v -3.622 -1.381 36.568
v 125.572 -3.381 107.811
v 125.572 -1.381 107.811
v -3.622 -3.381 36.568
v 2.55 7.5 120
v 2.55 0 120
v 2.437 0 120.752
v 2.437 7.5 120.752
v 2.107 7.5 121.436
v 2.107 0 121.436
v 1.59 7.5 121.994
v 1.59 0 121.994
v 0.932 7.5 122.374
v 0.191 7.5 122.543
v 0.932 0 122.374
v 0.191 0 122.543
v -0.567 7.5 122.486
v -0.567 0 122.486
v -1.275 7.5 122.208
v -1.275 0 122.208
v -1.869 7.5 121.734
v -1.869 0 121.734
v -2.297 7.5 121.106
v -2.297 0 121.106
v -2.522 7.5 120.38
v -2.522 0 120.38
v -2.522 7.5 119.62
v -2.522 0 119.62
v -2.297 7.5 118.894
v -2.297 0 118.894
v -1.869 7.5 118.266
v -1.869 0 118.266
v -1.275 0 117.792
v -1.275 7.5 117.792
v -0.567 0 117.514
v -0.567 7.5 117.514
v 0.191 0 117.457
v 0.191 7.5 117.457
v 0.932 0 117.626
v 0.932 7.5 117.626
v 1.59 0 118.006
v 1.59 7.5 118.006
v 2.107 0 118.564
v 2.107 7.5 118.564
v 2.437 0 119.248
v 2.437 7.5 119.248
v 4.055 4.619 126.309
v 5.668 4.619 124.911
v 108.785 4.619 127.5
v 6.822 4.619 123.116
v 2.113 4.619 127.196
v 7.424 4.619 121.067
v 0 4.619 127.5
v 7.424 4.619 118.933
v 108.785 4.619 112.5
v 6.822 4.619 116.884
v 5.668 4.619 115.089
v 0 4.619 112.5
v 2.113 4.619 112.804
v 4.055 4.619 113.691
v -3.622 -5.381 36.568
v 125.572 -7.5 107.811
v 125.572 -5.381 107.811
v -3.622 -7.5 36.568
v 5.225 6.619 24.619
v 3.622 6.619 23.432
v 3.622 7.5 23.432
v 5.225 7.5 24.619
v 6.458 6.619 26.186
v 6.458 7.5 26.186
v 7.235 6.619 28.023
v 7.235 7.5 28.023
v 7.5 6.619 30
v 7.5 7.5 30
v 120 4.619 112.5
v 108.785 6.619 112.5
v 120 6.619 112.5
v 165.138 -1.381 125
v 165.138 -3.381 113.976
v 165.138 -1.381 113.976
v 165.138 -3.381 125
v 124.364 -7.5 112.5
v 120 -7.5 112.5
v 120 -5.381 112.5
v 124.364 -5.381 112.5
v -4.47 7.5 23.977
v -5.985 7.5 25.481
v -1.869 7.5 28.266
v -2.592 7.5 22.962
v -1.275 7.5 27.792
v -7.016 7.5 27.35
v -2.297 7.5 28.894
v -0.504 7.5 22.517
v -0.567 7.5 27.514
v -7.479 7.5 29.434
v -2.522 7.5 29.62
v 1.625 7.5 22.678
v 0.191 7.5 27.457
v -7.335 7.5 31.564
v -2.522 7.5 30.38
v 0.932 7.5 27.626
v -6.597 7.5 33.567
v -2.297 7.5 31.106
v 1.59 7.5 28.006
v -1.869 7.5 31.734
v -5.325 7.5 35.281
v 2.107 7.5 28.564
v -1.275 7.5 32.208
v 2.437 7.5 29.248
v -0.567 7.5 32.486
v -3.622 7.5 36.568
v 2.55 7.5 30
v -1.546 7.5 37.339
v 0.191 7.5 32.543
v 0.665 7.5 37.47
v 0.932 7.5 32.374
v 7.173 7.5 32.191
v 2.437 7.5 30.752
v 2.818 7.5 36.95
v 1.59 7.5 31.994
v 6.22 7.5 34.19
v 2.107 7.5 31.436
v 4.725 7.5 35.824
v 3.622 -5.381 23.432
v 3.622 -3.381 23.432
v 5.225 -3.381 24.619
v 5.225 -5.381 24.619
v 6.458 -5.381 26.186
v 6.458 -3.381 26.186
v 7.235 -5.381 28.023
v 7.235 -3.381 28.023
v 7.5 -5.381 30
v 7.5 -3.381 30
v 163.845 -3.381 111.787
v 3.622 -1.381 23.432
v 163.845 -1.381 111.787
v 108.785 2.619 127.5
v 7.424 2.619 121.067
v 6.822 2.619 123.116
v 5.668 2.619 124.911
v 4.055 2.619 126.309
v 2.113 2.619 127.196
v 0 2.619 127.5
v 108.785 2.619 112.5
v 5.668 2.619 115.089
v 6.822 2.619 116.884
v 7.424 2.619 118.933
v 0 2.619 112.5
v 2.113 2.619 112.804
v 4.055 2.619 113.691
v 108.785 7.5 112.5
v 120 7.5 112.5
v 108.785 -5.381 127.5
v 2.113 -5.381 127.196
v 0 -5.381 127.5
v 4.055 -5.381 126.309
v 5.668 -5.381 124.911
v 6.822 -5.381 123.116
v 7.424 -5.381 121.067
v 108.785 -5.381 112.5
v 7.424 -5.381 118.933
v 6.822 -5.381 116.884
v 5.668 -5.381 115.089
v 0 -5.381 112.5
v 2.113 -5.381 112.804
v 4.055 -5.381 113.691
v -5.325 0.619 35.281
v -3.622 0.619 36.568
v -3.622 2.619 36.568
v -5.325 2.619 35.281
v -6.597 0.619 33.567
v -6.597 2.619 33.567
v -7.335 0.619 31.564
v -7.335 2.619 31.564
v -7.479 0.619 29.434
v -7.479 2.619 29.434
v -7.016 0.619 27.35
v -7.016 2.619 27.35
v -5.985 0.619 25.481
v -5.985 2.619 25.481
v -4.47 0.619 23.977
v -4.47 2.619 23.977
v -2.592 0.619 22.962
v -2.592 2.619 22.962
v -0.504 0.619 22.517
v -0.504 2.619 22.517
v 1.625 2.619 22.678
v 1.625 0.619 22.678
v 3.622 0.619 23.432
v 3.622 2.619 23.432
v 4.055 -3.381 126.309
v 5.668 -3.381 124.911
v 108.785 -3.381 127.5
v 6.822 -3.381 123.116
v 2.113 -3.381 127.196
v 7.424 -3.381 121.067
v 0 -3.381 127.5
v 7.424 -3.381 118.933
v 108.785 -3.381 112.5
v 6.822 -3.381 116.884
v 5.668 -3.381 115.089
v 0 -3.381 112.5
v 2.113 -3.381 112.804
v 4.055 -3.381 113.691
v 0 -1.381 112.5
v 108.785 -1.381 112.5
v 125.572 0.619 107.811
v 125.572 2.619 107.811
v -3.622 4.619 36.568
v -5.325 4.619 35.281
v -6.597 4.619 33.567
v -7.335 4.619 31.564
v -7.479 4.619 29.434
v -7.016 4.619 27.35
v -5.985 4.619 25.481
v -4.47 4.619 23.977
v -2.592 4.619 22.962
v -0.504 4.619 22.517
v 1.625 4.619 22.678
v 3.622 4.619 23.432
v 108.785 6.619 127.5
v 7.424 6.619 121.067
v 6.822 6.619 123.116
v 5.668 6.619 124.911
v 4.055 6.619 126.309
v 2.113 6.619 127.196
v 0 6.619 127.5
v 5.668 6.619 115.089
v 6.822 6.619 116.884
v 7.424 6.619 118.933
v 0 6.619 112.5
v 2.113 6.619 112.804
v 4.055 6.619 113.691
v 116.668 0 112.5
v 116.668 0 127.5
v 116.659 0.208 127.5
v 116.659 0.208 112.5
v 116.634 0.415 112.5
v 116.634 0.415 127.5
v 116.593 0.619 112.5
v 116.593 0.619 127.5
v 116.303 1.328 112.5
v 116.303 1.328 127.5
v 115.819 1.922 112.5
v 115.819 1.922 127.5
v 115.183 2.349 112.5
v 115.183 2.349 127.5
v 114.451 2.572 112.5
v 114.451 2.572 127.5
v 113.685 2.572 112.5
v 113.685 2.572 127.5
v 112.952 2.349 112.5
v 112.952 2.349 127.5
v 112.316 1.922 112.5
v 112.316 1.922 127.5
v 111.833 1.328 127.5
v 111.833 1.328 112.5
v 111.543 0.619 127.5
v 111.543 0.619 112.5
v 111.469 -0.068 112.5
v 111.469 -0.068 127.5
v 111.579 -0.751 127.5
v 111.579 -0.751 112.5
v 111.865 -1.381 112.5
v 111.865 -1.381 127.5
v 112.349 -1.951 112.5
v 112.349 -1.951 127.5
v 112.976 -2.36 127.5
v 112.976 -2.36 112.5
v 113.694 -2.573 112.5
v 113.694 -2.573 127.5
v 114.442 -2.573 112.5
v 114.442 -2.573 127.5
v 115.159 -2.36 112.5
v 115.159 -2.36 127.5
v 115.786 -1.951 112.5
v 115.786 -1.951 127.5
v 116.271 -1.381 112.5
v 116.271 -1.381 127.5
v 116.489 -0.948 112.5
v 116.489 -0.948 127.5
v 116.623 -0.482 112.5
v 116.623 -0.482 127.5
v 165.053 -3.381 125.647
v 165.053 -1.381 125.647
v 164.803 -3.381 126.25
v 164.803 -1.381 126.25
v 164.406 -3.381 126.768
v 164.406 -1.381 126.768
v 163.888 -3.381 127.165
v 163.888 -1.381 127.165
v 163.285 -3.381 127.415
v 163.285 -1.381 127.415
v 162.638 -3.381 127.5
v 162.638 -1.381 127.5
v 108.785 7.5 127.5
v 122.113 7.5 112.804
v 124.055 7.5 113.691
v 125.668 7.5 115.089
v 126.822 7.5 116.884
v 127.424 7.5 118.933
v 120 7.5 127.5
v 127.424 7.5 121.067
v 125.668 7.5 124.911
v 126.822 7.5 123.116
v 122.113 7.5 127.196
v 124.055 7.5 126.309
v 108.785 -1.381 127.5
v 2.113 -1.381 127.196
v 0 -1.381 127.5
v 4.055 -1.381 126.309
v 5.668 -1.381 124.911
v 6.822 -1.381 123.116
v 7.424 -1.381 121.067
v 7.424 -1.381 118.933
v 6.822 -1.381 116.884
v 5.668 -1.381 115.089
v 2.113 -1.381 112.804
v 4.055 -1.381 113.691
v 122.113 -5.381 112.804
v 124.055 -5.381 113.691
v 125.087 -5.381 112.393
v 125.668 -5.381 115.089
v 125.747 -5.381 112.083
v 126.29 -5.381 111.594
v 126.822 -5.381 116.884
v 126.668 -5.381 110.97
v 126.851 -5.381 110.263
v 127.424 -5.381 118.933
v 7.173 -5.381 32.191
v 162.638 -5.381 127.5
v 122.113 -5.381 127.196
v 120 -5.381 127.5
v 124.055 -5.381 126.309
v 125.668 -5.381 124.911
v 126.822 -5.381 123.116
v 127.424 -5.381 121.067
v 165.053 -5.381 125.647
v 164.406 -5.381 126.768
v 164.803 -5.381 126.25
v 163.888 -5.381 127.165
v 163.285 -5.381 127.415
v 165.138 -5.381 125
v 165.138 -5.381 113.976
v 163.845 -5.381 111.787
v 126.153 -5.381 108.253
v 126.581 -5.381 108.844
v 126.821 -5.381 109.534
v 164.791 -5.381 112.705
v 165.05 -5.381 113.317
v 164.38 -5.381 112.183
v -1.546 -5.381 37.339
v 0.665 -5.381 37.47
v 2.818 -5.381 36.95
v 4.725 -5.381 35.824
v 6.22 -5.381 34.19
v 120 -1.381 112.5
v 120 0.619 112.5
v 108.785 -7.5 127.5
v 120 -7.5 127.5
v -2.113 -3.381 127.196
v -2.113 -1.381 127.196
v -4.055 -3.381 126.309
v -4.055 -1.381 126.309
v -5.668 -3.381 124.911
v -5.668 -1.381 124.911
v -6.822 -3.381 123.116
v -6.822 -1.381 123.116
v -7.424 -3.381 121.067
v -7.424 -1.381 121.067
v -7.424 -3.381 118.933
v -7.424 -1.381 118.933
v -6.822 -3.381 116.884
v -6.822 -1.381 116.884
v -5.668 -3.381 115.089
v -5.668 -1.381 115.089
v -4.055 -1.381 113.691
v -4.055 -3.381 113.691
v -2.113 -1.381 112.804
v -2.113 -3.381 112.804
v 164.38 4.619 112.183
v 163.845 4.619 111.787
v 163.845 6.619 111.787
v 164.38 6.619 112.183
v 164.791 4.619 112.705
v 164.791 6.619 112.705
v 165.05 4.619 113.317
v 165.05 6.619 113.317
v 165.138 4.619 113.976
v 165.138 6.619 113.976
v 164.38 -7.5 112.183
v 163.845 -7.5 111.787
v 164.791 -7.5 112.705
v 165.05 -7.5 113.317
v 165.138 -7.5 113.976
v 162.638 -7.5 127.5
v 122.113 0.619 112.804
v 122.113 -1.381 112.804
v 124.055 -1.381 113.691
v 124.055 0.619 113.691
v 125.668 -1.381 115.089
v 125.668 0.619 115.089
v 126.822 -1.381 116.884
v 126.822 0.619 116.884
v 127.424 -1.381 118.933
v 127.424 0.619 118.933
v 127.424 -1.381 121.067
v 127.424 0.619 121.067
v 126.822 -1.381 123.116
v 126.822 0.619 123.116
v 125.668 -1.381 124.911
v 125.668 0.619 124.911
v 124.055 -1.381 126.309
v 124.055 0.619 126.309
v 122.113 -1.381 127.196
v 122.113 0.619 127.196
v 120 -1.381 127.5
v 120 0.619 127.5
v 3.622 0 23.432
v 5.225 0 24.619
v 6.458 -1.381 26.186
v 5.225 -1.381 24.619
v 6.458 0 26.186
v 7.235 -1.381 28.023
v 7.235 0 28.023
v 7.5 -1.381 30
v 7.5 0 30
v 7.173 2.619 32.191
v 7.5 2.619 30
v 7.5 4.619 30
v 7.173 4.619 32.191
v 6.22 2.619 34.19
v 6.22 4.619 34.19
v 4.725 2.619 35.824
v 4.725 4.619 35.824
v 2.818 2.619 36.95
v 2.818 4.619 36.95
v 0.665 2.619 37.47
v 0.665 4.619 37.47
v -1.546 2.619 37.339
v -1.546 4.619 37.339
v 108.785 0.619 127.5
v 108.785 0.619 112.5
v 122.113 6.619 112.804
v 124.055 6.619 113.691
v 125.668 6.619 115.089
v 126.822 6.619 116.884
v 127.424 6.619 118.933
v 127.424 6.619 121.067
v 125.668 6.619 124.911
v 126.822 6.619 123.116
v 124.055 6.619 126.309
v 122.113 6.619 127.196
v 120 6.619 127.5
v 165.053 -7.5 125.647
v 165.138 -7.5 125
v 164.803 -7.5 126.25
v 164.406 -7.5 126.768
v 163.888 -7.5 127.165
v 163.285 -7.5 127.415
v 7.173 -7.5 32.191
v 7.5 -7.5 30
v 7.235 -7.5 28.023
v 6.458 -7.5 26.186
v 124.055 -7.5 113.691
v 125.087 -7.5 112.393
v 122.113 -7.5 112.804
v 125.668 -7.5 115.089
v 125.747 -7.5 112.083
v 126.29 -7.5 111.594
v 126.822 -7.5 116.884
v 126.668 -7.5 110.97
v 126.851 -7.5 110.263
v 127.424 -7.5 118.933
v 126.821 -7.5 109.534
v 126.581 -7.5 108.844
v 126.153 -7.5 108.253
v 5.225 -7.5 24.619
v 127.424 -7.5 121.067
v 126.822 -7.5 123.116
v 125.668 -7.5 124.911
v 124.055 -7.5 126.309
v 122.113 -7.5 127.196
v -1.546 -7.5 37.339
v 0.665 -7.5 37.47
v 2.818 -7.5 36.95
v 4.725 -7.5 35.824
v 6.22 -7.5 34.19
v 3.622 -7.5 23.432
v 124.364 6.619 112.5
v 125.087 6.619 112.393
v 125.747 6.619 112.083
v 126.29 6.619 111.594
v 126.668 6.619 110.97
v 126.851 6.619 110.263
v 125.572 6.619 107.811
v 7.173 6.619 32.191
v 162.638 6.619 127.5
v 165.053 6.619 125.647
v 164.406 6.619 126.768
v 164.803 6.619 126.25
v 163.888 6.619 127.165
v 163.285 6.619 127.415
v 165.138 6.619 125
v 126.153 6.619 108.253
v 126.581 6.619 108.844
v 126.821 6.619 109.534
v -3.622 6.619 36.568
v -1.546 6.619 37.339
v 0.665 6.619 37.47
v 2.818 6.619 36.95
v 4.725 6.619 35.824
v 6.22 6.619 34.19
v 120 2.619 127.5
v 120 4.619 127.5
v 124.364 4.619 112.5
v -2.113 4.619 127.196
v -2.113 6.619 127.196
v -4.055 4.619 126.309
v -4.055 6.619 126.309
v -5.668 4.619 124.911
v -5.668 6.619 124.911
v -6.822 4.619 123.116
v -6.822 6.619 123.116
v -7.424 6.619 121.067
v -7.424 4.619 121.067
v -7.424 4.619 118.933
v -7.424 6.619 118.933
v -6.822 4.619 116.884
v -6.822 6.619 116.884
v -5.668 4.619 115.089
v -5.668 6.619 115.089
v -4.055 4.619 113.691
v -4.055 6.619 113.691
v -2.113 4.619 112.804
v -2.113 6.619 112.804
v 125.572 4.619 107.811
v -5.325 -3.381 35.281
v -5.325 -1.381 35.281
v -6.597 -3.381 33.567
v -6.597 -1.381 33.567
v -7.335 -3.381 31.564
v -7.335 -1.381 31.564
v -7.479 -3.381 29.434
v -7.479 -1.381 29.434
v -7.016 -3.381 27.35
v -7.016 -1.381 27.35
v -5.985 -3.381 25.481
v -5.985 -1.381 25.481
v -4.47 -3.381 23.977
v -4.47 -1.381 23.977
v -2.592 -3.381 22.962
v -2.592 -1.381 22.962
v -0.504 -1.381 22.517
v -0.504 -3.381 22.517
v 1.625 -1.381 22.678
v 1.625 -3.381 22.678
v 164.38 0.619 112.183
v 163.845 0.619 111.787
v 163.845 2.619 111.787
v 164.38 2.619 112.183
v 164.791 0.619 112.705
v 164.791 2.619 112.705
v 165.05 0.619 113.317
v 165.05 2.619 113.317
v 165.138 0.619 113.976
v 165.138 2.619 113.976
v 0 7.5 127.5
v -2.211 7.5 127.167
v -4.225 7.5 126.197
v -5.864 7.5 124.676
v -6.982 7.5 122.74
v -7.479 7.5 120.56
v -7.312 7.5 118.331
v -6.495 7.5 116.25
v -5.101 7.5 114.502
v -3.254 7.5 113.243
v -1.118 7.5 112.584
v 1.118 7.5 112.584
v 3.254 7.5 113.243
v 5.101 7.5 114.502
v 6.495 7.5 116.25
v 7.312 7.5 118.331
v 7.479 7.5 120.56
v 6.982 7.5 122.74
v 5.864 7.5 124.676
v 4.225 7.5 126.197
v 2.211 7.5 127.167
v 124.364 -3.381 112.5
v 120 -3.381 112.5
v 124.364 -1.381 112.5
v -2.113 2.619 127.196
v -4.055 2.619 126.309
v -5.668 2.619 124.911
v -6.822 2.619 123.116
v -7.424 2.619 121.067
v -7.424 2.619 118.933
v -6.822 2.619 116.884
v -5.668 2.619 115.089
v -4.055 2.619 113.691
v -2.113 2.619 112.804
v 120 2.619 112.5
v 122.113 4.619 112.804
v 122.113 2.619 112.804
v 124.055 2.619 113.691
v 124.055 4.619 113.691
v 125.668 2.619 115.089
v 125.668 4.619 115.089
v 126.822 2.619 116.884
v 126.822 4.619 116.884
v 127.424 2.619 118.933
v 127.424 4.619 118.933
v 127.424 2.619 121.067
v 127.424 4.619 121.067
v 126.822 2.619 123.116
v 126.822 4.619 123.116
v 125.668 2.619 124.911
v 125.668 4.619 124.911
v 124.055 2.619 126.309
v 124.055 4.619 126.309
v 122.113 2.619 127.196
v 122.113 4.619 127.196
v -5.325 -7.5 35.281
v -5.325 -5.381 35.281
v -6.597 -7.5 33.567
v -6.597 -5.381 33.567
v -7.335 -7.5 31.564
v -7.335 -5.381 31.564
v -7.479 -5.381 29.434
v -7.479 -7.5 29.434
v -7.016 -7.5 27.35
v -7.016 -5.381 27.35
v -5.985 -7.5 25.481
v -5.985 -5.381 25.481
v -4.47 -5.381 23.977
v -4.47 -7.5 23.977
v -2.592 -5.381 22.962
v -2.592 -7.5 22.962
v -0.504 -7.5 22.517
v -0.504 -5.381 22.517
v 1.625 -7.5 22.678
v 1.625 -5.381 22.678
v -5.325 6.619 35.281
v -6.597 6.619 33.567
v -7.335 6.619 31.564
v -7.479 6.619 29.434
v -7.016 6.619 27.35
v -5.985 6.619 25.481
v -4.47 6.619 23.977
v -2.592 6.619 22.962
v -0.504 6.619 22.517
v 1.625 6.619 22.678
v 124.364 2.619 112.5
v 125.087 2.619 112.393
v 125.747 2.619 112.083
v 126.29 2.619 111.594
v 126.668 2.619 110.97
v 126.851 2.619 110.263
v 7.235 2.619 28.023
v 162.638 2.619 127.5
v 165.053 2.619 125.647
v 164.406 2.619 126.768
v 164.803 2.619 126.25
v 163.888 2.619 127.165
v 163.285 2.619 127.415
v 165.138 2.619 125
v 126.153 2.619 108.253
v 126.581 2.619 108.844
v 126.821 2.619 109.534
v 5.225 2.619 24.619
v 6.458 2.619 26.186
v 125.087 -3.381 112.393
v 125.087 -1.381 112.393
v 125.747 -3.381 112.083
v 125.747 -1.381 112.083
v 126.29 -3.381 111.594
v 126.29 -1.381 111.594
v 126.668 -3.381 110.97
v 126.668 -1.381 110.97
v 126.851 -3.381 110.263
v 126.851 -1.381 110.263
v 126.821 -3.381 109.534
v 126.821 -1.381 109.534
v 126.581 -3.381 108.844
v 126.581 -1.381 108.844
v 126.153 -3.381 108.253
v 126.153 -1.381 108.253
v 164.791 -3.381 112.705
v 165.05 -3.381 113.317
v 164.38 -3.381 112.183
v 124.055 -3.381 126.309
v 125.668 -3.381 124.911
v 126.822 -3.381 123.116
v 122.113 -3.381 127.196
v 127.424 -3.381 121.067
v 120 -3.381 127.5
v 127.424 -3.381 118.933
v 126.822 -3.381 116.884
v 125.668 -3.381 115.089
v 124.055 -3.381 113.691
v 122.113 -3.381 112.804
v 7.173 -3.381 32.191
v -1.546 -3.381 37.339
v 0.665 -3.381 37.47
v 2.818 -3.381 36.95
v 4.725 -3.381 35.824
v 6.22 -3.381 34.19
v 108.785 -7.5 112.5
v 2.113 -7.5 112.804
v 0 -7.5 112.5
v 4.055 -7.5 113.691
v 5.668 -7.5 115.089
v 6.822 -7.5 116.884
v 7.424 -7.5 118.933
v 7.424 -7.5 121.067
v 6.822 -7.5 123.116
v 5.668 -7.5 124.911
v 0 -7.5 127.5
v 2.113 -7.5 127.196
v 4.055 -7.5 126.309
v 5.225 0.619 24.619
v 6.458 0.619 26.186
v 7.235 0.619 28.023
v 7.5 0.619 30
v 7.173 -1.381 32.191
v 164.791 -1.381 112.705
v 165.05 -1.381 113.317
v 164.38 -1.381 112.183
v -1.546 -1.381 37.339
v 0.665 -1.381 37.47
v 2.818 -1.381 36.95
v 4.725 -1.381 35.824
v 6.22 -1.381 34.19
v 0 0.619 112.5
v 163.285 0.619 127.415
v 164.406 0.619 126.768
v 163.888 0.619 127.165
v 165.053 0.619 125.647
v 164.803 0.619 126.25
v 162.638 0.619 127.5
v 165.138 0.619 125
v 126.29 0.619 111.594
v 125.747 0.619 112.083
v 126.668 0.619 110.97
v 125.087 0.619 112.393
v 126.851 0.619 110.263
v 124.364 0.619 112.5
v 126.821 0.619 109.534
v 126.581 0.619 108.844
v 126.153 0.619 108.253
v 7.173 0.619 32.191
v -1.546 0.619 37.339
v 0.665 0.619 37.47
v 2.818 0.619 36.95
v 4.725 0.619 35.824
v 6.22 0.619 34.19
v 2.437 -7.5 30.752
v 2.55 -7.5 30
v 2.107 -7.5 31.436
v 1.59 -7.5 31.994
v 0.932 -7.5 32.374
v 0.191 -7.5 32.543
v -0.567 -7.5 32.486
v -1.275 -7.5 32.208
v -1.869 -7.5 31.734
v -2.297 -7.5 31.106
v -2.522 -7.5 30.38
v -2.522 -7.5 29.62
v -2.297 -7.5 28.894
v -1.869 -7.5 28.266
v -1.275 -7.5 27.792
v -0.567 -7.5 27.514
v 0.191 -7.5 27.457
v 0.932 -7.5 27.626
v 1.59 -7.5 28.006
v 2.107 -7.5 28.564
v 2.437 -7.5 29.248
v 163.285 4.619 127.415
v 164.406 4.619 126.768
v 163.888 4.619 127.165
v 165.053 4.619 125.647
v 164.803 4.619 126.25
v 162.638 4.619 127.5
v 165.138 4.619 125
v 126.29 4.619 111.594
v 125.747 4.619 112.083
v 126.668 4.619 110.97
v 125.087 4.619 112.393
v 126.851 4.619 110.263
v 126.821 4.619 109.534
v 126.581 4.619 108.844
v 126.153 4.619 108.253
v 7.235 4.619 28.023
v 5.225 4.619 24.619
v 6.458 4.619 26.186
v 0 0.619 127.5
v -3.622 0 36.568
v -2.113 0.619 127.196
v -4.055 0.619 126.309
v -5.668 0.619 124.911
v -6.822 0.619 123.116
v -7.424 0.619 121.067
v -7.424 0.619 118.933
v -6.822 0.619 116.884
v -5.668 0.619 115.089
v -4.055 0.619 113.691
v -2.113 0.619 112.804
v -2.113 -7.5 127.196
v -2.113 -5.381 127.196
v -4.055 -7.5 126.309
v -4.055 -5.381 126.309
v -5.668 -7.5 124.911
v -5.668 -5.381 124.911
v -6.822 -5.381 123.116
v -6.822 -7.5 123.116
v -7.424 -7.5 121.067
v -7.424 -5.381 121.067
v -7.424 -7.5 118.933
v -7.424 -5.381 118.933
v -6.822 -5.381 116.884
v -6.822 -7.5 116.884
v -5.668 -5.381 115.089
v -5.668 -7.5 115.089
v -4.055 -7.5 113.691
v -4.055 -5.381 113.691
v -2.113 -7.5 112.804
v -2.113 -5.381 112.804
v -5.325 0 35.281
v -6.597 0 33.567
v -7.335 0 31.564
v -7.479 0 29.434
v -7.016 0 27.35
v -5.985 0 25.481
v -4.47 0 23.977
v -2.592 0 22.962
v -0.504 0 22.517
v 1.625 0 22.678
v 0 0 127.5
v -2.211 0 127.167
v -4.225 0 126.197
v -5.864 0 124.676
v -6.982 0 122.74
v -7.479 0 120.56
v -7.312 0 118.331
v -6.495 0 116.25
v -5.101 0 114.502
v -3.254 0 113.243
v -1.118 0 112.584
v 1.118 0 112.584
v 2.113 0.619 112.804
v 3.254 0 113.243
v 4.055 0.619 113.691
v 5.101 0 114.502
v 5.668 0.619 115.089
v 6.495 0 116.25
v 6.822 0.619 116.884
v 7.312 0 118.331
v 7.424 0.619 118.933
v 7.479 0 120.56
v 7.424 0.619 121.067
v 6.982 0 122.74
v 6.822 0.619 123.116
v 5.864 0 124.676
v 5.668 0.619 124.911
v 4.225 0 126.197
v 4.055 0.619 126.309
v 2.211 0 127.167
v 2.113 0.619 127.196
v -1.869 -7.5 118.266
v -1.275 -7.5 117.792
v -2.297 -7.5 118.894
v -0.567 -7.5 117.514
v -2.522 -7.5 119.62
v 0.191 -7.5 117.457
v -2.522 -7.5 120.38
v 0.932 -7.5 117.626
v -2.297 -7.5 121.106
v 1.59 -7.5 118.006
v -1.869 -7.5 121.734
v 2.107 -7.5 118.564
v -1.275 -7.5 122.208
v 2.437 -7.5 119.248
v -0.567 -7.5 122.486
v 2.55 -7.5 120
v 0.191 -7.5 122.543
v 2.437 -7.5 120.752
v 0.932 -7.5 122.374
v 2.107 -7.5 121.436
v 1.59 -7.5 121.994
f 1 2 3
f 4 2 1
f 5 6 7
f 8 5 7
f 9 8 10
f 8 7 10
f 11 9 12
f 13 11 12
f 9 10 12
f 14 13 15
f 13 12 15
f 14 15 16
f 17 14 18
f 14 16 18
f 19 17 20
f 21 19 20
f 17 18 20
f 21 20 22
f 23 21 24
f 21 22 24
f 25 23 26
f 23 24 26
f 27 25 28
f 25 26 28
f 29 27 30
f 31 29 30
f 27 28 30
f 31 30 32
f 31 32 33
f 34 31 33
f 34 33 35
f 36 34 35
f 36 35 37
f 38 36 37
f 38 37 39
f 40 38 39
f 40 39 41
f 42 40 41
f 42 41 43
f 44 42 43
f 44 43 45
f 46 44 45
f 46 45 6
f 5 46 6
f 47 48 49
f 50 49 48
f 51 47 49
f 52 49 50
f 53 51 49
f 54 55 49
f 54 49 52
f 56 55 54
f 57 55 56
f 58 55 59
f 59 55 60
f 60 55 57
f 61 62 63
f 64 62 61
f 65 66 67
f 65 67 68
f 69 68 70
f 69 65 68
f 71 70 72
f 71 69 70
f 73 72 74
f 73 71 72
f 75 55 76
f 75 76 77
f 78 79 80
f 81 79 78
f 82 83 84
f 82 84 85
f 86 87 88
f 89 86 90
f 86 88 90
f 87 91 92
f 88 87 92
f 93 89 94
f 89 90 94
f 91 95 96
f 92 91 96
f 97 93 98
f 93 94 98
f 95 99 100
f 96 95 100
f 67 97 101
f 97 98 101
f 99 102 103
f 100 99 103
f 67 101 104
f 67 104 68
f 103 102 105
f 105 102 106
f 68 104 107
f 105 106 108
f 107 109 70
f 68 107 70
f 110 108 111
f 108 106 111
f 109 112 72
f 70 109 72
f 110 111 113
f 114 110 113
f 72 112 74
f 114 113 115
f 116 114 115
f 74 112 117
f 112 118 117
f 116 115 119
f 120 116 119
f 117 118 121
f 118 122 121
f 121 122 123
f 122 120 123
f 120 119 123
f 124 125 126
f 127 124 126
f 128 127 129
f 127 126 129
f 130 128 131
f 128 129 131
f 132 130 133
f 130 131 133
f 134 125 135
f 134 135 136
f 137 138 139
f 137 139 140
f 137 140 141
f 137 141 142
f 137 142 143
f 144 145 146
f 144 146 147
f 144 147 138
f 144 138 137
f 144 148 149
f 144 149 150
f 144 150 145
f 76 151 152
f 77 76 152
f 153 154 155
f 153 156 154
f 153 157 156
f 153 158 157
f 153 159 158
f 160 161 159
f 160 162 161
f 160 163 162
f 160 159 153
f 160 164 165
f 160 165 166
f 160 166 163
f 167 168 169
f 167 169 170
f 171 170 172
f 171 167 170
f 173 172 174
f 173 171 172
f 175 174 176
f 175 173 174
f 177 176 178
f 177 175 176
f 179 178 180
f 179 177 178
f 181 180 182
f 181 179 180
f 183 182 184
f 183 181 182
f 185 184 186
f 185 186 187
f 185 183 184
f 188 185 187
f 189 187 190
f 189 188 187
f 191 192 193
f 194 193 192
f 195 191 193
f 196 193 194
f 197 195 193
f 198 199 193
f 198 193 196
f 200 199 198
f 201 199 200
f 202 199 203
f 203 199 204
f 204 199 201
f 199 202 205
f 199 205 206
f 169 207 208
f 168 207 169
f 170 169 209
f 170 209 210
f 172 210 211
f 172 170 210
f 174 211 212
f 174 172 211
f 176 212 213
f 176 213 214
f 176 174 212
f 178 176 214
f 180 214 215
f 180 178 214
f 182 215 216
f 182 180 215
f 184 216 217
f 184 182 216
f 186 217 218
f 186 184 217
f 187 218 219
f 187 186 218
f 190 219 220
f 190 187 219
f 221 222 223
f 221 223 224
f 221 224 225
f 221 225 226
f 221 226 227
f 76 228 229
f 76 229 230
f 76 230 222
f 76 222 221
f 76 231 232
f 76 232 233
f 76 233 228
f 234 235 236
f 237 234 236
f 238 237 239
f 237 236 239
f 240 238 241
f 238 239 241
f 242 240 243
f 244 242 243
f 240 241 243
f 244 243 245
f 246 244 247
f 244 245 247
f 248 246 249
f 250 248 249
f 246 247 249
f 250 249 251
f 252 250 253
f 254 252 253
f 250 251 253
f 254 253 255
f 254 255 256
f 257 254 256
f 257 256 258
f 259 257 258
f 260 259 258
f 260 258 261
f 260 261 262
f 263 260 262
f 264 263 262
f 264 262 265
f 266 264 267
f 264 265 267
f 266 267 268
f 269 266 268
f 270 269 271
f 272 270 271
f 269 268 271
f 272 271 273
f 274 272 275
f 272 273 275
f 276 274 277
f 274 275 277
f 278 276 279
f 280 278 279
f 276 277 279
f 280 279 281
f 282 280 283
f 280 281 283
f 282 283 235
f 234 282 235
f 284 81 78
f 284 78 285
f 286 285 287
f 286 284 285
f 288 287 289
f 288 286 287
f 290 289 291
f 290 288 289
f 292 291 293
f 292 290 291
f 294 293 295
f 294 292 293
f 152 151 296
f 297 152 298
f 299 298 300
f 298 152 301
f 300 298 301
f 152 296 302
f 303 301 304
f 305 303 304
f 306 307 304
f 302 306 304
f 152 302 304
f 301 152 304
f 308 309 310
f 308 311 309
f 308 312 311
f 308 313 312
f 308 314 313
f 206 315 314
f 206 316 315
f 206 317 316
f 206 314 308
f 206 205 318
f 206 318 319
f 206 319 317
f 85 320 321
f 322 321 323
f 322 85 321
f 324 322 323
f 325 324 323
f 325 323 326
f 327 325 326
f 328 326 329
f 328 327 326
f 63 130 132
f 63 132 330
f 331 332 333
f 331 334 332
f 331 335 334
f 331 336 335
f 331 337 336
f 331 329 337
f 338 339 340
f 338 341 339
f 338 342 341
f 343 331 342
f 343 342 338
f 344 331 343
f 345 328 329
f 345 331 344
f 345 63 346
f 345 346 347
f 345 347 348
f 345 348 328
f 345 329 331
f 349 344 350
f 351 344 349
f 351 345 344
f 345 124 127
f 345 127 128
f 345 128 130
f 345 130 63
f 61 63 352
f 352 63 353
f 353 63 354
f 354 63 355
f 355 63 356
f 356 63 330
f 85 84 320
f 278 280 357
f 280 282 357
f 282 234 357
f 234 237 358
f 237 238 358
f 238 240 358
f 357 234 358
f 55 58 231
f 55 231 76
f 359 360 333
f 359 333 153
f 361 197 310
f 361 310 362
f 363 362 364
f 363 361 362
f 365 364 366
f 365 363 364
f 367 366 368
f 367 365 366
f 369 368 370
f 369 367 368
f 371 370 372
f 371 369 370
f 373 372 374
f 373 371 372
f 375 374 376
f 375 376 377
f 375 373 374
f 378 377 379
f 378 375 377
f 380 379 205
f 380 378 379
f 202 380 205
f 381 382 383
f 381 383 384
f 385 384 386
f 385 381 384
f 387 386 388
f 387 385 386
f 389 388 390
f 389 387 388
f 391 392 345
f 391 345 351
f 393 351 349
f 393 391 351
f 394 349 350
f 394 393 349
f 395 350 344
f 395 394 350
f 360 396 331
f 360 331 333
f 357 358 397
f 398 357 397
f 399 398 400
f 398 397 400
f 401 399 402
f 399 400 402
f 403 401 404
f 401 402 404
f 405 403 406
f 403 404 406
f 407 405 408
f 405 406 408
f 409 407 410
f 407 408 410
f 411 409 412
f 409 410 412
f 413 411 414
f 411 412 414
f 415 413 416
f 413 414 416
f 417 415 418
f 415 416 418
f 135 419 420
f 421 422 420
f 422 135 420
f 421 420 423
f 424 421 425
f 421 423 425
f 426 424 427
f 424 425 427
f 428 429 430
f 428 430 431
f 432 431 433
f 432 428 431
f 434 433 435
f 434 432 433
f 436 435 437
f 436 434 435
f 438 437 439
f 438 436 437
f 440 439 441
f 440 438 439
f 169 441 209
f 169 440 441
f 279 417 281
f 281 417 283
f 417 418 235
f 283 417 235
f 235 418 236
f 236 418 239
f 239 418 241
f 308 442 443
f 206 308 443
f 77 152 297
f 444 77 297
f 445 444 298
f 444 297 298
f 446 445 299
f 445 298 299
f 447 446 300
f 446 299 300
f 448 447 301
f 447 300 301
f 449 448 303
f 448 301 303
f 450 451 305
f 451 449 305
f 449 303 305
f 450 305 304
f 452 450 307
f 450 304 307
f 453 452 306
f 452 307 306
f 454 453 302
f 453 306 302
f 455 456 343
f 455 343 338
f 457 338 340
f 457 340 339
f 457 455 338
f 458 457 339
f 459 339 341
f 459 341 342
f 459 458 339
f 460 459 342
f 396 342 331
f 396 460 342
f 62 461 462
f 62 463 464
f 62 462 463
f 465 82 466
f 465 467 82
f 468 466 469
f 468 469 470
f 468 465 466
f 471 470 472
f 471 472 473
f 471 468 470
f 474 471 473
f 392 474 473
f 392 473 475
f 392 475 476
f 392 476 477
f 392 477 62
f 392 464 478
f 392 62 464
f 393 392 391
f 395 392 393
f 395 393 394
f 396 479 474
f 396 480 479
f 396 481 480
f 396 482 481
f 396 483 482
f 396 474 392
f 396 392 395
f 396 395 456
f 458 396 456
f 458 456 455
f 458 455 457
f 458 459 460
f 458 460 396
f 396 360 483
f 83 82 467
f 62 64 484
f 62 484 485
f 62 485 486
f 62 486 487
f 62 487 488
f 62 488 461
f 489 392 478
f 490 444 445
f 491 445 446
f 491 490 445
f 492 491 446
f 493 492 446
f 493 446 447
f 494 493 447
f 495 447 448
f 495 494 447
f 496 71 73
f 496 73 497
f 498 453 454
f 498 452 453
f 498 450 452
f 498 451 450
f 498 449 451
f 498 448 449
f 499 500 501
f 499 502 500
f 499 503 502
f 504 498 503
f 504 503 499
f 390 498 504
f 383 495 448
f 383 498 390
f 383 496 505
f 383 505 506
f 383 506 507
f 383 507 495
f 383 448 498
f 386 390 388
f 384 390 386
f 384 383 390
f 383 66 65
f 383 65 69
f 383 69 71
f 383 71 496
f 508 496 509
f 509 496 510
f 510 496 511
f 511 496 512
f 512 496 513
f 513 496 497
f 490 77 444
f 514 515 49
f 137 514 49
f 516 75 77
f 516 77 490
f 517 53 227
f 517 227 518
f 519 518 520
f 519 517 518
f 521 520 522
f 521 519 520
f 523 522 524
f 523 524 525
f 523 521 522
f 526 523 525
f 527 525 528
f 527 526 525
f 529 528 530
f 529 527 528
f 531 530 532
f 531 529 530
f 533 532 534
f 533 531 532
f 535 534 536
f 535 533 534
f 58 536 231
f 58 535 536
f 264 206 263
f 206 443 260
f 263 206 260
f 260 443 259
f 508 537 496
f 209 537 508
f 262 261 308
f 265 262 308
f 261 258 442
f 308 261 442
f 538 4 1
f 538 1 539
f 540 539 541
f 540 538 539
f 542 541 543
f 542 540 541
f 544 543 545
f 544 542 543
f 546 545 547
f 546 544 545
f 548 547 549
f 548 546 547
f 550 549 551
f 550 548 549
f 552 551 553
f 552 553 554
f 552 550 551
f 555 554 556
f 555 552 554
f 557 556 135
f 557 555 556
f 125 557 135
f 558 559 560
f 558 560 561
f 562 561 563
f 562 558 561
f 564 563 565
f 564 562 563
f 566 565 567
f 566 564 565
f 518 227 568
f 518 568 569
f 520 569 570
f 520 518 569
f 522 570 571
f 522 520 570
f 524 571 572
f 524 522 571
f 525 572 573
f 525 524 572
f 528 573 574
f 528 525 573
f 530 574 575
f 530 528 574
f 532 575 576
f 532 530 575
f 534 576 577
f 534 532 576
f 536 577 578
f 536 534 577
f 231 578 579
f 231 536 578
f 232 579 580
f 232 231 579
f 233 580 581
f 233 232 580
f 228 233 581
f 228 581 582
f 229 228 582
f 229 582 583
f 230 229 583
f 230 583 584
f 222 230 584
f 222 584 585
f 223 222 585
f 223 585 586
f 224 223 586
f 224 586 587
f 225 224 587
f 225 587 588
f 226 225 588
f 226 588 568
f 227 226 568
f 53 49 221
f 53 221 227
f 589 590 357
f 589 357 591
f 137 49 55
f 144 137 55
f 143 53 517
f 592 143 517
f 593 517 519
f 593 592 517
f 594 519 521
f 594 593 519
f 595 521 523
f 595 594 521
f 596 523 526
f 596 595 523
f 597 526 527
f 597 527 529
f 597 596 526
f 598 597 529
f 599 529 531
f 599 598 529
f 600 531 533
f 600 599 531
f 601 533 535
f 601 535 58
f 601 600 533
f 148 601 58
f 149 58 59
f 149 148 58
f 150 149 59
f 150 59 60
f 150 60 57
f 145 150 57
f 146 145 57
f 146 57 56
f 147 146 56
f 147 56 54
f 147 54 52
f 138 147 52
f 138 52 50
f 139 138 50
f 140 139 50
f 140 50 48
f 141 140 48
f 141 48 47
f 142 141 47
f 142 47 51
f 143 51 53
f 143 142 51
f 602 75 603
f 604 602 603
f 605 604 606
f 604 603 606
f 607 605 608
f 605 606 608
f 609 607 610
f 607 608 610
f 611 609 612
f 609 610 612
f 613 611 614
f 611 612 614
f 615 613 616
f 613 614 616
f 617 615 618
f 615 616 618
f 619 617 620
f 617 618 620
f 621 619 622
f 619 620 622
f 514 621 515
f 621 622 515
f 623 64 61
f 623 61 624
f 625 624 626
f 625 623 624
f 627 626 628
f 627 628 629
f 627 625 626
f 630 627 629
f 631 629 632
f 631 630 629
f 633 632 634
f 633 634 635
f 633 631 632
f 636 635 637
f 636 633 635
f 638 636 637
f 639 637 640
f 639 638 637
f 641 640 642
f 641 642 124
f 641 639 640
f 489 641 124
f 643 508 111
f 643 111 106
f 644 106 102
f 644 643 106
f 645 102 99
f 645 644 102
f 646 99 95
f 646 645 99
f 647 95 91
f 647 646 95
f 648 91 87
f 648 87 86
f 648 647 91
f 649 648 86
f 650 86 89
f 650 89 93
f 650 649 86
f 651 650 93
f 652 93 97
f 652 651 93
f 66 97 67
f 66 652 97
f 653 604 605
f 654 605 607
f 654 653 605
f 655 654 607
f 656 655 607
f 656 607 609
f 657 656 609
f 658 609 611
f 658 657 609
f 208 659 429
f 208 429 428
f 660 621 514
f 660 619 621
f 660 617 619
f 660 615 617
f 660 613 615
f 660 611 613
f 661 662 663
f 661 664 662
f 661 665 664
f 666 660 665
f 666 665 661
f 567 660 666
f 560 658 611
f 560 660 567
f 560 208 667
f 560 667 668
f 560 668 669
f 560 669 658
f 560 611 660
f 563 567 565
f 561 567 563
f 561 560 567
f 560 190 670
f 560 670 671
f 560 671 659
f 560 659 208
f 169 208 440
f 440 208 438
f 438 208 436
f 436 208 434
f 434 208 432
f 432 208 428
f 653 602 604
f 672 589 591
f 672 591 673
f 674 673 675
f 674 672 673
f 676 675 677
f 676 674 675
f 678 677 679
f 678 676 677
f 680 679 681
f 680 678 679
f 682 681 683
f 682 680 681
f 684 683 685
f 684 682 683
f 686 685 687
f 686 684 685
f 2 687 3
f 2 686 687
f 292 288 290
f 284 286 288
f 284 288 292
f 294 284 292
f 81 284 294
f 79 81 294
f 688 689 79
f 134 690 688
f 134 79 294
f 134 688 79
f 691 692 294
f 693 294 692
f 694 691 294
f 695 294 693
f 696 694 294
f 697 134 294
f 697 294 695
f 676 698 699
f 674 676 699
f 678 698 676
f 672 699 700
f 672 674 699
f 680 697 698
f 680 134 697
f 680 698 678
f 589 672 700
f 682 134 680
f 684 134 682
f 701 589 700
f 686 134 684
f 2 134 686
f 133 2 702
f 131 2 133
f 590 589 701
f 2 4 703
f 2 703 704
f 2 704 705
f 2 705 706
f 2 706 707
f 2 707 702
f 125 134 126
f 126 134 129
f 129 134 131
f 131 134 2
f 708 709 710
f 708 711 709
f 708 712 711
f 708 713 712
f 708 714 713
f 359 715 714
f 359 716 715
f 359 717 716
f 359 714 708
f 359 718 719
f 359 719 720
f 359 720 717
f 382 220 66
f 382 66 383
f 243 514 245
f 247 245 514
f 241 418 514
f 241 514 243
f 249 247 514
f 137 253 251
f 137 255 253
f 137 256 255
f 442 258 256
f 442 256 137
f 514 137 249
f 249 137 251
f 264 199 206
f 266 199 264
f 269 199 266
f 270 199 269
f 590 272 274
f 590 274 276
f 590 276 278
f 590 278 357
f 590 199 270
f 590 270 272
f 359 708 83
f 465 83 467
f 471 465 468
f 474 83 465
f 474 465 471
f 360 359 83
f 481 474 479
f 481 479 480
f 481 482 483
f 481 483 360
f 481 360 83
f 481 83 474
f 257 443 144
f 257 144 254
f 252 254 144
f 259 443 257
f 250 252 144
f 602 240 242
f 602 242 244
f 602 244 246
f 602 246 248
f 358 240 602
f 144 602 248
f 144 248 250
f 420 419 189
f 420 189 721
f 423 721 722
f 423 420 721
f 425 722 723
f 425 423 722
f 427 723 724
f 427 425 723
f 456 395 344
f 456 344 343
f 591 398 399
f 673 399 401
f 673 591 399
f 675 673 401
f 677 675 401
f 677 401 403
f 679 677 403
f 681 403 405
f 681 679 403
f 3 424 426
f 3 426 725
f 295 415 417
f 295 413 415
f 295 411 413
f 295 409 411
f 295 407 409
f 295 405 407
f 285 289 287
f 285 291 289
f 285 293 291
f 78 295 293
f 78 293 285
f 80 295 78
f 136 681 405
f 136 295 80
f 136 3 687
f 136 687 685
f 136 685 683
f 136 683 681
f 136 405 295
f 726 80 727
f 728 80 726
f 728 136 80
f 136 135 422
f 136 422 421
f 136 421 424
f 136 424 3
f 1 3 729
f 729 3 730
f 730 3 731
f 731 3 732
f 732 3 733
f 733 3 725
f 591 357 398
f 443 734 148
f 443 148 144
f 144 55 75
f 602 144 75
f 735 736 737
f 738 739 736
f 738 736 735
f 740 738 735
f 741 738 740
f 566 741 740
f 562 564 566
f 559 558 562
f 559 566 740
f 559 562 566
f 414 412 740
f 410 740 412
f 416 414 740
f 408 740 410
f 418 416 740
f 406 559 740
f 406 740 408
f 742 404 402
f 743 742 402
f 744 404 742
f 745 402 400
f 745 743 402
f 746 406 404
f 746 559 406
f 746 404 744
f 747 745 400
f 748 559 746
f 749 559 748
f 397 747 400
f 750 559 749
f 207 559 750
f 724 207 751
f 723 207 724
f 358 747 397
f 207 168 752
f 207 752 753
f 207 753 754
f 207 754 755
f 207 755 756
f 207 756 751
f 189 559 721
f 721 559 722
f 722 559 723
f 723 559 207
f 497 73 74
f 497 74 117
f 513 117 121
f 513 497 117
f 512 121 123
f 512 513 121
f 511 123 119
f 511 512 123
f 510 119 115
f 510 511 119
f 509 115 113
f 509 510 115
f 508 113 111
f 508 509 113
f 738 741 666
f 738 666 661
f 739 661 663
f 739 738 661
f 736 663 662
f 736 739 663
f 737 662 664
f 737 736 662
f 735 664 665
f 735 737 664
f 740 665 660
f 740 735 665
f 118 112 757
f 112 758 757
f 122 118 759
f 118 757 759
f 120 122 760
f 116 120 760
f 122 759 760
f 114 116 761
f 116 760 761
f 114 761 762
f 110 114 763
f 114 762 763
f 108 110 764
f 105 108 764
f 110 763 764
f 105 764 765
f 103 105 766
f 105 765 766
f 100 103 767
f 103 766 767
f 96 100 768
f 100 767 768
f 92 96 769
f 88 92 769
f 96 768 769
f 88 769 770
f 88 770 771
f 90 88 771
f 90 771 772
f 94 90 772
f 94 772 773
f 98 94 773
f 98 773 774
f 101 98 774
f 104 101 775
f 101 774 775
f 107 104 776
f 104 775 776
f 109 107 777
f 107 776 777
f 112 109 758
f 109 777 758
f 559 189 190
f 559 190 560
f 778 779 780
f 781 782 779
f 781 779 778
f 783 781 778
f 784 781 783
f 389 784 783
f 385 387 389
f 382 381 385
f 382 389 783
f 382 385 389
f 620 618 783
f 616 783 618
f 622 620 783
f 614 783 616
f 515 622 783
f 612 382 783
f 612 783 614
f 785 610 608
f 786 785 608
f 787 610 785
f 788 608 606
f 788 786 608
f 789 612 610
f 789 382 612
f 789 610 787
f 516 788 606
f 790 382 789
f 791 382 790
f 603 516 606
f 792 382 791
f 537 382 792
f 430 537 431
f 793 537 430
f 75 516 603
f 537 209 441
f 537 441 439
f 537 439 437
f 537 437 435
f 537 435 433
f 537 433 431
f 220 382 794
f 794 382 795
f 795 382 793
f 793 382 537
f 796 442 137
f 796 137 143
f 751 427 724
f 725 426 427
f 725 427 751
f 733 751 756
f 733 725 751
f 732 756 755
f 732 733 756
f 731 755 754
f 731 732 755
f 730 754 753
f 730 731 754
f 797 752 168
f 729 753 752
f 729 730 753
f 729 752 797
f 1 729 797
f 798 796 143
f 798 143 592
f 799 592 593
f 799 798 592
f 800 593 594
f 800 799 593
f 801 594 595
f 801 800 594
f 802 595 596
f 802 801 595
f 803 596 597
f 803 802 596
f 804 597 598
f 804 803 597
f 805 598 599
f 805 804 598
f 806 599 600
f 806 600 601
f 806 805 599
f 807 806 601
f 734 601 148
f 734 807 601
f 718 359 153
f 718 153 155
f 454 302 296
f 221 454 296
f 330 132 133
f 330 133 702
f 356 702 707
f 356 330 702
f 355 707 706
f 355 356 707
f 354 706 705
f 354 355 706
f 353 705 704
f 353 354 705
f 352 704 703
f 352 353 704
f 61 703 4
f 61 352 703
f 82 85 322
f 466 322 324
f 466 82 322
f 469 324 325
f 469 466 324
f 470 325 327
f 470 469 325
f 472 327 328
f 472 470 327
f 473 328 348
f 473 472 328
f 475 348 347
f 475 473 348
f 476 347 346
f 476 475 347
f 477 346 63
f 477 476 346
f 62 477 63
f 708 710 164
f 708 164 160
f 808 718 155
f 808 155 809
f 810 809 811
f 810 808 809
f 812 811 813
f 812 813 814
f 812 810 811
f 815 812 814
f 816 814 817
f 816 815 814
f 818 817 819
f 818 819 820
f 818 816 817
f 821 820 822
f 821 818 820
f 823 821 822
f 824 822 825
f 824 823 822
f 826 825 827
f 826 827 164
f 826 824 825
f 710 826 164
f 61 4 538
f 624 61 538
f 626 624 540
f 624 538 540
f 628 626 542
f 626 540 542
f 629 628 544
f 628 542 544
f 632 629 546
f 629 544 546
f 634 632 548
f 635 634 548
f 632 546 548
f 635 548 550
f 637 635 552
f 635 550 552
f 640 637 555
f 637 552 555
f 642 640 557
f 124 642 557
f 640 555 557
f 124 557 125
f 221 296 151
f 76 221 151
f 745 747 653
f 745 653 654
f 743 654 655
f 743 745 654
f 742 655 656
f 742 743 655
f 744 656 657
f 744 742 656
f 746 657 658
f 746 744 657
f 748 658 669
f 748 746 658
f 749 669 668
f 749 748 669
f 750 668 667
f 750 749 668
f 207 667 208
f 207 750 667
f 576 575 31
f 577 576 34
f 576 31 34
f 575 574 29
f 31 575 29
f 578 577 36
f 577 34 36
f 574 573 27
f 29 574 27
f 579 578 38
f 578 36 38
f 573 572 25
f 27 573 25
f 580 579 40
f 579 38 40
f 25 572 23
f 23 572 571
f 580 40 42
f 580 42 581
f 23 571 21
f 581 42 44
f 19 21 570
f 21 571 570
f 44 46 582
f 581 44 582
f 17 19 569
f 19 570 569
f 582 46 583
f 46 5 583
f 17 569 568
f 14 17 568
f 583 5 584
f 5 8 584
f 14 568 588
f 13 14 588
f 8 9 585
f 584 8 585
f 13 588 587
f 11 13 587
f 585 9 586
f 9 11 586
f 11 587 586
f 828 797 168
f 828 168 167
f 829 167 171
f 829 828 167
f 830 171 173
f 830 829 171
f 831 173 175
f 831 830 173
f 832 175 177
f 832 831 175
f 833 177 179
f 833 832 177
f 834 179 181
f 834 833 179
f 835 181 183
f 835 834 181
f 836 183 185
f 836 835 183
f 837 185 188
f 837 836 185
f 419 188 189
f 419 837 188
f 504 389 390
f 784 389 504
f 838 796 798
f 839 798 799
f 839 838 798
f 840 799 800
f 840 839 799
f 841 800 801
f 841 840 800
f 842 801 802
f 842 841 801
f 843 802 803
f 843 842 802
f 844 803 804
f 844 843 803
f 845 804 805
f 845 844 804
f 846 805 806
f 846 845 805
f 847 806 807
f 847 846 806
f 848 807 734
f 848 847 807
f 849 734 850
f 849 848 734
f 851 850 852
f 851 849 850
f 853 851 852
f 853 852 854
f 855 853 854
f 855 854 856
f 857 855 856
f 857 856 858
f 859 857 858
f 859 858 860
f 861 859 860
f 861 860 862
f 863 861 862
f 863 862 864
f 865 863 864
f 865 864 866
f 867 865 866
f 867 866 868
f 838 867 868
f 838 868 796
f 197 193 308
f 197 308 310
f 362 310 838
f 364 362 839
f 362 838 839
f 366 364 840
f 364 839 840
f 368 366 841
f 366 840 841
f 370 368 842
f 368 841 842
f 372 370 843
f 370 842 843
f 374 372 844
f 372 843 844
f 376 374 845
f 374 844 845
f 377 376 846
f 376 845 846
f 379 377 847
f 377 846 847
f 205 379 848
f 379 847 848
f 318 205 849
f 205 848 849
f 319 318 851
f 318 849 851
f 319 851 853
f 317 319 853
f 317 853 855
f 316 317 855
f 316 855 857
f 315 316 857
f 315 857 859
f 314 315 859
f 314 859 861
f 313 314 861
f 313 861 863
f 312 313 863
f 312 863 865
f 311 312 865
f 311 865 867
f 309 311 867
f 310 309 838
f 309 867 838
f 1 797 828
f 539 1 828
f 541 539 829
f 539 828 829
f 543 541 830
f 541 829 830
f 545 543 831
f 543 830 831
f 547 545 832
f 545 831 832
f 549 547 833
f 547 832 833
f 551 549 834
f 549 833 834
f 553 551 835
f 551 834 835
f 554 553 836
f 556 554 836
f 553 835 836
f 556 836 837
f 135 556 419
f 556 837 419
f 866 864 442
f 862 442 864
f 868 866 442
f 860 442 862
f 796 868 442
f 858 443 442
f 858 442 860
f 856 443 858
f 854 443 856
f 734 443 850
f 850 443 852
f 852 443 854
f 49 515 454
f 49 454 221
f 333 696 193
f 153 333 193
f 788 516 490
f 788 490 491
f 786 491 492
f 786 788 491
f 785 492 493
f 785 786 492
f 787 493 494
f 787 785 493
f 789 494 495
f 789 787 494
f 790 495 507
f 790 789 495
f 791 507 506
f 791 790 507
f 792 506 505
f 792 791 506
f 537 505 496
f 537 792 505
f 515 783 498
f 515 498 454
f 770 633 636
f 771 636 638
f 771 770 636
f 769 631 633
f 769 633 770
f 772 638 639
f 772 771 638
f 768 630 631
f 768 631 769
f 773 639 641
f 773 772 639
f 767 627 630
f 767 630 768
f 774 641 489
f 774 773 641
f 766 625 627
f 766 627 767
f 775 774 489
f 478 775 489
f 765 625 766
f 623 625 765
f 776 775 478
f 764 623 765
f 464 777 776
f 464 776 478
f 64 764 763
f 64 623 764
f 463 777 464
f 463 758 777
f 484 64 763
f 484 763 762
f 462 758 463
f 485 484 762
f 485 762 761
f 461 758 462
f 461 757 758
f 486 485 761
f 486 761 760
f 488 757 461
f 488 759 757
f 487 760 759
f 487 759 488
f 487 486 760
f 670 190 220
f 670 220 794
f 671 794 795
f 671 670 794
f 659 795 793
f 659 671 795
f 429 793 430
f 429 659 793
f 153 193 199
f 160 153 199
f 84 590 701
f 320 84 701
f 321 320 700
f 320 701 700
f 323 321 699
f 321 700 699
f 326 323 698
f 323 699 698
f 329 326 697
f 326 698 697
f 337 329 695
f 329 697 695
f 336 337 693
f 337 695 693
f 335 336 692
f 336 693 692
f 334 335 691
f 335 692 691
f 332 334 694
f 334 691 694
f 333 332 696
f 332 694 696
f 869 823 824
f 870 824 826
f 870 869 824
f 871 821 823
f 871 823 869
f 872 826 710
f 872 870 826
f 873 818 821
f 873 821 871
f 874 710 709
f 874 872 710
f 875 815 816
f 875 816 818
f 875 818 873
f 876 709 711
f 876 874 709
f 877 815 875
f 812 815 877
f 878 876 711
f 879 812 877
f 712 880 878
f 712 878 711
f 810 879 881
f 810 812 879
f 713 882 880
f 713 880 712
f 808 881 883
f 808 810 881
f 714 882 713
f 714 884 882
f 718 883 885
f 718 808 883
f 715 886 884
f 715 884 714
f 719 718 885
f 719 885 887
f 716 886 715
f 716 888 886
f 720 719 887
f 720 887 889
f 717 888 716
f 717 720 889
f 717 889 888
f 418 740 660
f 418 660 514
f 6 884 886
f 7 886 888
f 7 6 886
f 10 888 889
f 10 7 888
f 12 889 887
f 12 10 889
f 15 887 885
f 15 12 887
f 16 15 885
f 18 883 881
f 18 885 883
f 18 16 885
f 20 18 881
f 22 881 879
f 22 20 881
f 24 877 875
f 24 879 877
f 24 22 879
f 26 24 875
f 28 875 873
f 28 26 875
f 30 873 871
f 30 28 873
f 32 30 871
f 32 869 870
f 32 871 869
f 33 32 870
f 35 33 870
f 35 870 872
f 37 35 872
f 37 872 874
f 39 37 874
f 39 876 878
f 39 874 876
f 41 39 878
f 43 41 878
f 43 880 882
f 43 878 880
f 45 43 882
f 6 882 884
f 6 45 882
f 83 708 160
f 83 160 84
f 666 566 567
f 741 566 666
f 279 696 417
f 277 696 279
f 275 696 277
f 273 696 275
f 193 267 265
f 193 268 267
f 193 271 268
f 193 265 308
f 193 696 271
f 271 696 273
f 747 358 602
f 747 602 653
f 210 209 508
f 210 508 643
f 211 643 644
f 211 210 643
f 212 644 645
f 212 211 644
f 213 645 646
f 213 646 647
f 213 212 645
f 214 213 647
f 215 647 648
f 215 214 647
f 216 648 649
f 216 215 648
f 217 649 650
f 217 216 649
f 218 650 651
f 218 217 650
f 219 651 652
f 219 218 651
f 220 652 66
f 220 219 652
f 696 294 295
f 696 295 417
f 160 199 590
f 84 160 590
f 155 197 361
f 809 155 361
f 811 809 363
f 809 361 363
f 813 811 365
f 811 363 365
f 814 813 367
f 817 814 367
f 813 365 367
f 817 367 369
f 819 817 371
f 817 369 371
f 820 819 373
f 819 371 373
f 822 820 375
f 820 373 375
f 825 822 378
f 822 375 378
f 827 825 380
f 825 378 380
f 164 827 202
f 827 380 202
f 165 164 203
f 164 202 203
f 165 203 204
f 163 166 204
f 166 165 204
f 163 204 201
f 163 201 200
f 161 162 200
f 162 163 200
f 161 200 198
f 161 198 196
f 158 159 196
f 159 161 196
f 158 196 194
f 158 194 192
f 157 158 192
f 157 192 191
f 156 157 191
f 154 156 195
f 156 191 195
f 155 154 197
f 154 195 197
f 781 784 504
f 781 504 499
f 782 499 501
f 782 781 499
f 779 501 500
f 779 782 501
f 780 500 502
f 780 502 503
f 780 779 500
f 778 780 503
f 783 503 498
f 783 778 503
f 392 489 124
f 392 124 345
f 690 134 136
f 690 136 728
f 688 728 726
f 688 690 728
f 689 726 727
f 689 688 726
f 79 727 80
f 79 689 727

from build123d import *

# Parameters (mm, degrees)
F1_DEPTH = 7.5
F2_W     = 25
F2_H     = 2
F2_W_2   = 87.9392416629
F3_DEPTH = 127.501
F4_DEPTH = 7.5
F5_D     = 3
F5_DEPTH = 13.5
F5_TIP   = 0.9012909285
F7_R     = 2.6
F8_DEPTH = 15
F6_R     = 2.55
F9_DEPTH = 12.5


with BuildPart() as f1:
    # F0 (on Front) → F1 (new body, symmetric)
    with BuildSketch(Plane.XZ):
        with BuildLine():
            ThreePointArc((0, 127.5), (5.3033008589, 125.3033008589), (7.5, 120))
            ThreePointArc((7.5, 120), (5.3033008589, 114.6966991411), (0, 112.5))
            Line((0, 112.5), (108.7850481272, 112.5))
            Line((108.7850481272, 112.5), (108.7850481272, 127.5))
            Line((108.7850481272, 127.5), (0, 127.5))
        make_face()
        with BuildLine():
            Line((120, 127.5), (108.7850481272, 127.5))
            Line((108.7850481272, 127.5), (108.7850481272, 112.5))
            Line((108.7850481272, 112.5), (120, 112.5))
            ThreePointArc((120, 112.5), (127.5, 120), (120, 127.5))
        make_face()
        with BuildLine():
            ThreePointArc((0, 112.5), (5.3033008589, 114.6966991411), (7.5, 120))
            ThreePointArc((7.5, 120), (5.3033008589, 125.3033008589), (0, 127.5))
            ThreePointArc((0, 127.5), (-7.5, 120), (0, 112.5))
        make_face()
        with BuildLine():
            Line((162.6379891518, 127.5), (120, 127.5))
            ThreePointArc((120, 127.5), (127.5, 120), (120, 112.5))
            Line((120, 112.5), (124.3643918131, 112.5))
            ThreePointArc((124.3643918131, 112.5), (126.7854456219, 110.6232964421), (125.5716191931, 107.8107987637))
            Line((125.5716191931, 107.8107987637), (-3.6216821402, 36.5676037088))
            ThreePointArc((-3.6216821402, 36.5676037088), (3.813619275, 36.4580421202), (7.5, 30))
            ThreePointArc((7.5, 30), (6.4580421202, 26.186380725), (3.6216821402, 23.4323962912))
            Line((3.6216821402, 23.4323962912), (163.8452165318, 111.7871050513))
            ThreePointArc((163.8452165318, 111.7871050513), (164.7906698585, 112.7050998626), (165.1379891518, 113.9763062876))
            Line((165.1379891518, 113.9763062876), (165.1379891518, 125))
            ThreePointArc((165.1379891518, 125), (164.4057561047, 126.767766953), (162.6379891518, 127.5))
        make_face()
        with BuildLine():
            ThreePointArc((7.5, 30), (3.813619275, 36.4580421202), (-3.6216821402, 36.5676037088))
            ThreePointArc((-3.6216821402, 36.5676037088), (-6.5676037088, 26.3783178598), (3.6216821402, 23.4323962912))
            ThreePointArc((3.6216821402, 23.4323962912), (6.4580421202, 26.186380725), (7.5, 30))
        make_face()
    extrude(amount=F1_DEPTH, both=True)

    # F2 (on Top) → F3 (cut, through all)
    with BuildSketch(Plane.XY):
        with Locations((23.2615718412, 7.6191863865)):
            Rectangle(F2_W, F2_H)
        with Locations((-1.7384281588, 7.6191863865)):
            Rectangle(F2_W, F2_H)
        with Locations((261.2008135041, 7.6191863865)):
            Rectangle(F2_W, F2_H)
        with Locations((211.2008135041, 7.6191863865)):
            Rectangle(F2_W, F2_H)
        with Locations((48.2615718412, 7.6191863865)):
            Rectangle(F2_W, F2_H)
        with Locations((236.2008135041, 7.6191863865)):
            Rectangle(F2_W, F2_H)
        with Locations((186.2008135041, 7.6191863865)):
            Rectangle(F2_W, F2_H)
        with Locations((129.7311926726, 7.6191863865)):
            Rectangle(F2_W_2, F2_H)
        with Locations((73.2615718412, 7.6191863865)):
            Rectangle(F2_W, F2_H)
        with Locations((48.2615718412, 3.6191863865)):
            Rectangle(F2_W, F2_H)
        with Locations((73.2615718412, 3.6191863865)):
            Rectangle(F2_W, F2_H)
        with Locations((-1.7384281588, 3.6191863865)):
            Rectangle(F2_W, F2_H)
        with Locations((261.2008135041, 3.6191863865)):
            Rectangle(F2_W, F2_H)
        with Locations((23.2615718412, 3.6191863865)):
            Rectangle(F2_W, F2_H)
        with Locations((236.2008135041, 3.6191863865)):
            Rectangle(F2_W, F2_H)
        with Locations((129.7311926726, 3.6191863865)):
            Rectangle(F2_W_2, F2_H)
        with Locations((186.2008135041, 3.6191863865)):
            Rectangle(F2_W, F2_H)
        with Locations((211.2008135041, 3.6191863865)):
            Rectangle(F2_W, F2_H)
        with Locations((261.2008135041, -0.3808136135)):
            Rectangle(F2_W, F2_H)
        with Locations((129.7311926726, -0.3808136135)):
            Rectangle(F2_W_2, F2_H)
        with Locations((48.2615718412, -0.3808136135)):
            Rectangle(F2_W, F2_H)
        with Locations((73.2615718412, -0.3808136135)):
            Rectangle(F2_W, F2_H)
        with Locations((-1.7384281588, -0.3808136135)):
            Rectangle(F2_W, F2_H)
        with Locations((23.2615718412, -0.3808136135)):
            Rectangle(F2_W, F2_H)
        with Locations((236.2008135041, -0.3808136135)):
            Rectangle(F2_W, F2_H)
        with Locations((186.2008135041, -0.3808136135)):
            Rectangle(F2_W, F2_H)
        with Locations((211.2008135041, -0.3808136135)):
            Rectangle(F2_W, F2_H)
        with Locations((236.2008135041, -4.3808136135)):
            Rectangle(F2_W, F2_H)
        with Locations((261.2008135041, -4.3808136135)):
            Rectangle(F2_W, F2_H)
        with Locations((48.2615718412, -4.3808136135)):
            Rectangle(F2_W, F2_H)
        with Locations((73.2615718412, -4.3808136135)):
            Rectangle(F2_W, F2_H)
        with Locations((129.7311926726, -4.3808136135)):
            Rectangle(F2_W_2, F2_H)
        with Locations((186.2008135041, -4.3808136135)):
            Rectangle(F2_W, F2_H)
        with Locations((211.2008135041, -4.3808136135)):
            Rectangle(F2_W, F2_H)
        with Locations((23.2615718412, -4.3808136135)):
            Rectangle(F2_W, F2_H)
        with Locations((-1.7384281588, -4.3808136135)):
            Rectangle(F2_W, F2_H)
    extrude(amount=F3_DEPTH, mode=Mode.SUBTRACT)

    # F0 (on Front) → F4 (join, symmetric)
    with BuildSketch(Plane.XZ):
        with BuildLine():
            ThreePointArc((0, 112.5), (5.3033008589, 114.6966991411), (7.5, 120))
            ThreePointArc((7.5, 120), (5.3033008589, 125.3033008589), (0, 127.5))
            ThreePointArc((0, 127.5), (-7.5, 120), (0, 112.5))
        make_face()
        with BuildLine():
            Line((120, 127.5), (108.7850481272, 127.5))
            Line((108.7850481272, 127.5), (108.7850481272, 112.5))
            Line((108.7850481272, 112.5), (120, 112.5))
            ThreePointArc((120, 112.5), (127.5, 120), (120, 127.5))
        make_face()
        with BuildLine():
            ThreePointArc((7.5, 30), (3.813619275, 36.4580421202), (-3.6216821402, 36.5676037088))
            ThreePointArc((-3.6216821402, 36.5676037088), (-6.5676037088, 26.3783178598), (3.6216821402, 23.4323962912))
            ThreePointArc((3.6216821402, 23.4323962912), (6.4580421202, 26.186380725), (7.5, 30))
        make_face()
    extrude(amount=F4_DEPTH, both=True)

    # F5 (one way)
    with BuildSketch(Plane.XZ):
        with Locations((0, 120), (0, 30)):
            Circle(F5_D / 2)
    extrude(amount=-F5_DEPTH, mode=Mode.SUBTRACT)
    with Locations(Plane.XZ):
        with Locations((0, 120), (0, 30)):
            with Locations((0, 0, -(F5_DEPTH + F5_TIP / 2))):  # 118° drill point
                Cone(0, F5_D / 2, F5_TIP, mode=Mode.SUBTRACT)

    # F7 (on face) → F8 (cut, through all)
    with BuildSketch(Plane.XY.offset(127.5)):
        with Locations((114.0677630901, 0)):
            Circle(F7_R)
    extrude(amount=-F8_DEPTH, mode=Mode.SUBTRACT)

    # F6 (on Front) → F9 (cut, symmetric)
    with BuildSketch(Plane.XZ):
        with Locations((0, 120)):
            Circle(F6_R)
        with Locations((0, 30)):
            Circle(F6_R)
    extrude(amount=F9_DEPTH, both=True, mode=Mode.SUBTRACT)


solid = f1.part
